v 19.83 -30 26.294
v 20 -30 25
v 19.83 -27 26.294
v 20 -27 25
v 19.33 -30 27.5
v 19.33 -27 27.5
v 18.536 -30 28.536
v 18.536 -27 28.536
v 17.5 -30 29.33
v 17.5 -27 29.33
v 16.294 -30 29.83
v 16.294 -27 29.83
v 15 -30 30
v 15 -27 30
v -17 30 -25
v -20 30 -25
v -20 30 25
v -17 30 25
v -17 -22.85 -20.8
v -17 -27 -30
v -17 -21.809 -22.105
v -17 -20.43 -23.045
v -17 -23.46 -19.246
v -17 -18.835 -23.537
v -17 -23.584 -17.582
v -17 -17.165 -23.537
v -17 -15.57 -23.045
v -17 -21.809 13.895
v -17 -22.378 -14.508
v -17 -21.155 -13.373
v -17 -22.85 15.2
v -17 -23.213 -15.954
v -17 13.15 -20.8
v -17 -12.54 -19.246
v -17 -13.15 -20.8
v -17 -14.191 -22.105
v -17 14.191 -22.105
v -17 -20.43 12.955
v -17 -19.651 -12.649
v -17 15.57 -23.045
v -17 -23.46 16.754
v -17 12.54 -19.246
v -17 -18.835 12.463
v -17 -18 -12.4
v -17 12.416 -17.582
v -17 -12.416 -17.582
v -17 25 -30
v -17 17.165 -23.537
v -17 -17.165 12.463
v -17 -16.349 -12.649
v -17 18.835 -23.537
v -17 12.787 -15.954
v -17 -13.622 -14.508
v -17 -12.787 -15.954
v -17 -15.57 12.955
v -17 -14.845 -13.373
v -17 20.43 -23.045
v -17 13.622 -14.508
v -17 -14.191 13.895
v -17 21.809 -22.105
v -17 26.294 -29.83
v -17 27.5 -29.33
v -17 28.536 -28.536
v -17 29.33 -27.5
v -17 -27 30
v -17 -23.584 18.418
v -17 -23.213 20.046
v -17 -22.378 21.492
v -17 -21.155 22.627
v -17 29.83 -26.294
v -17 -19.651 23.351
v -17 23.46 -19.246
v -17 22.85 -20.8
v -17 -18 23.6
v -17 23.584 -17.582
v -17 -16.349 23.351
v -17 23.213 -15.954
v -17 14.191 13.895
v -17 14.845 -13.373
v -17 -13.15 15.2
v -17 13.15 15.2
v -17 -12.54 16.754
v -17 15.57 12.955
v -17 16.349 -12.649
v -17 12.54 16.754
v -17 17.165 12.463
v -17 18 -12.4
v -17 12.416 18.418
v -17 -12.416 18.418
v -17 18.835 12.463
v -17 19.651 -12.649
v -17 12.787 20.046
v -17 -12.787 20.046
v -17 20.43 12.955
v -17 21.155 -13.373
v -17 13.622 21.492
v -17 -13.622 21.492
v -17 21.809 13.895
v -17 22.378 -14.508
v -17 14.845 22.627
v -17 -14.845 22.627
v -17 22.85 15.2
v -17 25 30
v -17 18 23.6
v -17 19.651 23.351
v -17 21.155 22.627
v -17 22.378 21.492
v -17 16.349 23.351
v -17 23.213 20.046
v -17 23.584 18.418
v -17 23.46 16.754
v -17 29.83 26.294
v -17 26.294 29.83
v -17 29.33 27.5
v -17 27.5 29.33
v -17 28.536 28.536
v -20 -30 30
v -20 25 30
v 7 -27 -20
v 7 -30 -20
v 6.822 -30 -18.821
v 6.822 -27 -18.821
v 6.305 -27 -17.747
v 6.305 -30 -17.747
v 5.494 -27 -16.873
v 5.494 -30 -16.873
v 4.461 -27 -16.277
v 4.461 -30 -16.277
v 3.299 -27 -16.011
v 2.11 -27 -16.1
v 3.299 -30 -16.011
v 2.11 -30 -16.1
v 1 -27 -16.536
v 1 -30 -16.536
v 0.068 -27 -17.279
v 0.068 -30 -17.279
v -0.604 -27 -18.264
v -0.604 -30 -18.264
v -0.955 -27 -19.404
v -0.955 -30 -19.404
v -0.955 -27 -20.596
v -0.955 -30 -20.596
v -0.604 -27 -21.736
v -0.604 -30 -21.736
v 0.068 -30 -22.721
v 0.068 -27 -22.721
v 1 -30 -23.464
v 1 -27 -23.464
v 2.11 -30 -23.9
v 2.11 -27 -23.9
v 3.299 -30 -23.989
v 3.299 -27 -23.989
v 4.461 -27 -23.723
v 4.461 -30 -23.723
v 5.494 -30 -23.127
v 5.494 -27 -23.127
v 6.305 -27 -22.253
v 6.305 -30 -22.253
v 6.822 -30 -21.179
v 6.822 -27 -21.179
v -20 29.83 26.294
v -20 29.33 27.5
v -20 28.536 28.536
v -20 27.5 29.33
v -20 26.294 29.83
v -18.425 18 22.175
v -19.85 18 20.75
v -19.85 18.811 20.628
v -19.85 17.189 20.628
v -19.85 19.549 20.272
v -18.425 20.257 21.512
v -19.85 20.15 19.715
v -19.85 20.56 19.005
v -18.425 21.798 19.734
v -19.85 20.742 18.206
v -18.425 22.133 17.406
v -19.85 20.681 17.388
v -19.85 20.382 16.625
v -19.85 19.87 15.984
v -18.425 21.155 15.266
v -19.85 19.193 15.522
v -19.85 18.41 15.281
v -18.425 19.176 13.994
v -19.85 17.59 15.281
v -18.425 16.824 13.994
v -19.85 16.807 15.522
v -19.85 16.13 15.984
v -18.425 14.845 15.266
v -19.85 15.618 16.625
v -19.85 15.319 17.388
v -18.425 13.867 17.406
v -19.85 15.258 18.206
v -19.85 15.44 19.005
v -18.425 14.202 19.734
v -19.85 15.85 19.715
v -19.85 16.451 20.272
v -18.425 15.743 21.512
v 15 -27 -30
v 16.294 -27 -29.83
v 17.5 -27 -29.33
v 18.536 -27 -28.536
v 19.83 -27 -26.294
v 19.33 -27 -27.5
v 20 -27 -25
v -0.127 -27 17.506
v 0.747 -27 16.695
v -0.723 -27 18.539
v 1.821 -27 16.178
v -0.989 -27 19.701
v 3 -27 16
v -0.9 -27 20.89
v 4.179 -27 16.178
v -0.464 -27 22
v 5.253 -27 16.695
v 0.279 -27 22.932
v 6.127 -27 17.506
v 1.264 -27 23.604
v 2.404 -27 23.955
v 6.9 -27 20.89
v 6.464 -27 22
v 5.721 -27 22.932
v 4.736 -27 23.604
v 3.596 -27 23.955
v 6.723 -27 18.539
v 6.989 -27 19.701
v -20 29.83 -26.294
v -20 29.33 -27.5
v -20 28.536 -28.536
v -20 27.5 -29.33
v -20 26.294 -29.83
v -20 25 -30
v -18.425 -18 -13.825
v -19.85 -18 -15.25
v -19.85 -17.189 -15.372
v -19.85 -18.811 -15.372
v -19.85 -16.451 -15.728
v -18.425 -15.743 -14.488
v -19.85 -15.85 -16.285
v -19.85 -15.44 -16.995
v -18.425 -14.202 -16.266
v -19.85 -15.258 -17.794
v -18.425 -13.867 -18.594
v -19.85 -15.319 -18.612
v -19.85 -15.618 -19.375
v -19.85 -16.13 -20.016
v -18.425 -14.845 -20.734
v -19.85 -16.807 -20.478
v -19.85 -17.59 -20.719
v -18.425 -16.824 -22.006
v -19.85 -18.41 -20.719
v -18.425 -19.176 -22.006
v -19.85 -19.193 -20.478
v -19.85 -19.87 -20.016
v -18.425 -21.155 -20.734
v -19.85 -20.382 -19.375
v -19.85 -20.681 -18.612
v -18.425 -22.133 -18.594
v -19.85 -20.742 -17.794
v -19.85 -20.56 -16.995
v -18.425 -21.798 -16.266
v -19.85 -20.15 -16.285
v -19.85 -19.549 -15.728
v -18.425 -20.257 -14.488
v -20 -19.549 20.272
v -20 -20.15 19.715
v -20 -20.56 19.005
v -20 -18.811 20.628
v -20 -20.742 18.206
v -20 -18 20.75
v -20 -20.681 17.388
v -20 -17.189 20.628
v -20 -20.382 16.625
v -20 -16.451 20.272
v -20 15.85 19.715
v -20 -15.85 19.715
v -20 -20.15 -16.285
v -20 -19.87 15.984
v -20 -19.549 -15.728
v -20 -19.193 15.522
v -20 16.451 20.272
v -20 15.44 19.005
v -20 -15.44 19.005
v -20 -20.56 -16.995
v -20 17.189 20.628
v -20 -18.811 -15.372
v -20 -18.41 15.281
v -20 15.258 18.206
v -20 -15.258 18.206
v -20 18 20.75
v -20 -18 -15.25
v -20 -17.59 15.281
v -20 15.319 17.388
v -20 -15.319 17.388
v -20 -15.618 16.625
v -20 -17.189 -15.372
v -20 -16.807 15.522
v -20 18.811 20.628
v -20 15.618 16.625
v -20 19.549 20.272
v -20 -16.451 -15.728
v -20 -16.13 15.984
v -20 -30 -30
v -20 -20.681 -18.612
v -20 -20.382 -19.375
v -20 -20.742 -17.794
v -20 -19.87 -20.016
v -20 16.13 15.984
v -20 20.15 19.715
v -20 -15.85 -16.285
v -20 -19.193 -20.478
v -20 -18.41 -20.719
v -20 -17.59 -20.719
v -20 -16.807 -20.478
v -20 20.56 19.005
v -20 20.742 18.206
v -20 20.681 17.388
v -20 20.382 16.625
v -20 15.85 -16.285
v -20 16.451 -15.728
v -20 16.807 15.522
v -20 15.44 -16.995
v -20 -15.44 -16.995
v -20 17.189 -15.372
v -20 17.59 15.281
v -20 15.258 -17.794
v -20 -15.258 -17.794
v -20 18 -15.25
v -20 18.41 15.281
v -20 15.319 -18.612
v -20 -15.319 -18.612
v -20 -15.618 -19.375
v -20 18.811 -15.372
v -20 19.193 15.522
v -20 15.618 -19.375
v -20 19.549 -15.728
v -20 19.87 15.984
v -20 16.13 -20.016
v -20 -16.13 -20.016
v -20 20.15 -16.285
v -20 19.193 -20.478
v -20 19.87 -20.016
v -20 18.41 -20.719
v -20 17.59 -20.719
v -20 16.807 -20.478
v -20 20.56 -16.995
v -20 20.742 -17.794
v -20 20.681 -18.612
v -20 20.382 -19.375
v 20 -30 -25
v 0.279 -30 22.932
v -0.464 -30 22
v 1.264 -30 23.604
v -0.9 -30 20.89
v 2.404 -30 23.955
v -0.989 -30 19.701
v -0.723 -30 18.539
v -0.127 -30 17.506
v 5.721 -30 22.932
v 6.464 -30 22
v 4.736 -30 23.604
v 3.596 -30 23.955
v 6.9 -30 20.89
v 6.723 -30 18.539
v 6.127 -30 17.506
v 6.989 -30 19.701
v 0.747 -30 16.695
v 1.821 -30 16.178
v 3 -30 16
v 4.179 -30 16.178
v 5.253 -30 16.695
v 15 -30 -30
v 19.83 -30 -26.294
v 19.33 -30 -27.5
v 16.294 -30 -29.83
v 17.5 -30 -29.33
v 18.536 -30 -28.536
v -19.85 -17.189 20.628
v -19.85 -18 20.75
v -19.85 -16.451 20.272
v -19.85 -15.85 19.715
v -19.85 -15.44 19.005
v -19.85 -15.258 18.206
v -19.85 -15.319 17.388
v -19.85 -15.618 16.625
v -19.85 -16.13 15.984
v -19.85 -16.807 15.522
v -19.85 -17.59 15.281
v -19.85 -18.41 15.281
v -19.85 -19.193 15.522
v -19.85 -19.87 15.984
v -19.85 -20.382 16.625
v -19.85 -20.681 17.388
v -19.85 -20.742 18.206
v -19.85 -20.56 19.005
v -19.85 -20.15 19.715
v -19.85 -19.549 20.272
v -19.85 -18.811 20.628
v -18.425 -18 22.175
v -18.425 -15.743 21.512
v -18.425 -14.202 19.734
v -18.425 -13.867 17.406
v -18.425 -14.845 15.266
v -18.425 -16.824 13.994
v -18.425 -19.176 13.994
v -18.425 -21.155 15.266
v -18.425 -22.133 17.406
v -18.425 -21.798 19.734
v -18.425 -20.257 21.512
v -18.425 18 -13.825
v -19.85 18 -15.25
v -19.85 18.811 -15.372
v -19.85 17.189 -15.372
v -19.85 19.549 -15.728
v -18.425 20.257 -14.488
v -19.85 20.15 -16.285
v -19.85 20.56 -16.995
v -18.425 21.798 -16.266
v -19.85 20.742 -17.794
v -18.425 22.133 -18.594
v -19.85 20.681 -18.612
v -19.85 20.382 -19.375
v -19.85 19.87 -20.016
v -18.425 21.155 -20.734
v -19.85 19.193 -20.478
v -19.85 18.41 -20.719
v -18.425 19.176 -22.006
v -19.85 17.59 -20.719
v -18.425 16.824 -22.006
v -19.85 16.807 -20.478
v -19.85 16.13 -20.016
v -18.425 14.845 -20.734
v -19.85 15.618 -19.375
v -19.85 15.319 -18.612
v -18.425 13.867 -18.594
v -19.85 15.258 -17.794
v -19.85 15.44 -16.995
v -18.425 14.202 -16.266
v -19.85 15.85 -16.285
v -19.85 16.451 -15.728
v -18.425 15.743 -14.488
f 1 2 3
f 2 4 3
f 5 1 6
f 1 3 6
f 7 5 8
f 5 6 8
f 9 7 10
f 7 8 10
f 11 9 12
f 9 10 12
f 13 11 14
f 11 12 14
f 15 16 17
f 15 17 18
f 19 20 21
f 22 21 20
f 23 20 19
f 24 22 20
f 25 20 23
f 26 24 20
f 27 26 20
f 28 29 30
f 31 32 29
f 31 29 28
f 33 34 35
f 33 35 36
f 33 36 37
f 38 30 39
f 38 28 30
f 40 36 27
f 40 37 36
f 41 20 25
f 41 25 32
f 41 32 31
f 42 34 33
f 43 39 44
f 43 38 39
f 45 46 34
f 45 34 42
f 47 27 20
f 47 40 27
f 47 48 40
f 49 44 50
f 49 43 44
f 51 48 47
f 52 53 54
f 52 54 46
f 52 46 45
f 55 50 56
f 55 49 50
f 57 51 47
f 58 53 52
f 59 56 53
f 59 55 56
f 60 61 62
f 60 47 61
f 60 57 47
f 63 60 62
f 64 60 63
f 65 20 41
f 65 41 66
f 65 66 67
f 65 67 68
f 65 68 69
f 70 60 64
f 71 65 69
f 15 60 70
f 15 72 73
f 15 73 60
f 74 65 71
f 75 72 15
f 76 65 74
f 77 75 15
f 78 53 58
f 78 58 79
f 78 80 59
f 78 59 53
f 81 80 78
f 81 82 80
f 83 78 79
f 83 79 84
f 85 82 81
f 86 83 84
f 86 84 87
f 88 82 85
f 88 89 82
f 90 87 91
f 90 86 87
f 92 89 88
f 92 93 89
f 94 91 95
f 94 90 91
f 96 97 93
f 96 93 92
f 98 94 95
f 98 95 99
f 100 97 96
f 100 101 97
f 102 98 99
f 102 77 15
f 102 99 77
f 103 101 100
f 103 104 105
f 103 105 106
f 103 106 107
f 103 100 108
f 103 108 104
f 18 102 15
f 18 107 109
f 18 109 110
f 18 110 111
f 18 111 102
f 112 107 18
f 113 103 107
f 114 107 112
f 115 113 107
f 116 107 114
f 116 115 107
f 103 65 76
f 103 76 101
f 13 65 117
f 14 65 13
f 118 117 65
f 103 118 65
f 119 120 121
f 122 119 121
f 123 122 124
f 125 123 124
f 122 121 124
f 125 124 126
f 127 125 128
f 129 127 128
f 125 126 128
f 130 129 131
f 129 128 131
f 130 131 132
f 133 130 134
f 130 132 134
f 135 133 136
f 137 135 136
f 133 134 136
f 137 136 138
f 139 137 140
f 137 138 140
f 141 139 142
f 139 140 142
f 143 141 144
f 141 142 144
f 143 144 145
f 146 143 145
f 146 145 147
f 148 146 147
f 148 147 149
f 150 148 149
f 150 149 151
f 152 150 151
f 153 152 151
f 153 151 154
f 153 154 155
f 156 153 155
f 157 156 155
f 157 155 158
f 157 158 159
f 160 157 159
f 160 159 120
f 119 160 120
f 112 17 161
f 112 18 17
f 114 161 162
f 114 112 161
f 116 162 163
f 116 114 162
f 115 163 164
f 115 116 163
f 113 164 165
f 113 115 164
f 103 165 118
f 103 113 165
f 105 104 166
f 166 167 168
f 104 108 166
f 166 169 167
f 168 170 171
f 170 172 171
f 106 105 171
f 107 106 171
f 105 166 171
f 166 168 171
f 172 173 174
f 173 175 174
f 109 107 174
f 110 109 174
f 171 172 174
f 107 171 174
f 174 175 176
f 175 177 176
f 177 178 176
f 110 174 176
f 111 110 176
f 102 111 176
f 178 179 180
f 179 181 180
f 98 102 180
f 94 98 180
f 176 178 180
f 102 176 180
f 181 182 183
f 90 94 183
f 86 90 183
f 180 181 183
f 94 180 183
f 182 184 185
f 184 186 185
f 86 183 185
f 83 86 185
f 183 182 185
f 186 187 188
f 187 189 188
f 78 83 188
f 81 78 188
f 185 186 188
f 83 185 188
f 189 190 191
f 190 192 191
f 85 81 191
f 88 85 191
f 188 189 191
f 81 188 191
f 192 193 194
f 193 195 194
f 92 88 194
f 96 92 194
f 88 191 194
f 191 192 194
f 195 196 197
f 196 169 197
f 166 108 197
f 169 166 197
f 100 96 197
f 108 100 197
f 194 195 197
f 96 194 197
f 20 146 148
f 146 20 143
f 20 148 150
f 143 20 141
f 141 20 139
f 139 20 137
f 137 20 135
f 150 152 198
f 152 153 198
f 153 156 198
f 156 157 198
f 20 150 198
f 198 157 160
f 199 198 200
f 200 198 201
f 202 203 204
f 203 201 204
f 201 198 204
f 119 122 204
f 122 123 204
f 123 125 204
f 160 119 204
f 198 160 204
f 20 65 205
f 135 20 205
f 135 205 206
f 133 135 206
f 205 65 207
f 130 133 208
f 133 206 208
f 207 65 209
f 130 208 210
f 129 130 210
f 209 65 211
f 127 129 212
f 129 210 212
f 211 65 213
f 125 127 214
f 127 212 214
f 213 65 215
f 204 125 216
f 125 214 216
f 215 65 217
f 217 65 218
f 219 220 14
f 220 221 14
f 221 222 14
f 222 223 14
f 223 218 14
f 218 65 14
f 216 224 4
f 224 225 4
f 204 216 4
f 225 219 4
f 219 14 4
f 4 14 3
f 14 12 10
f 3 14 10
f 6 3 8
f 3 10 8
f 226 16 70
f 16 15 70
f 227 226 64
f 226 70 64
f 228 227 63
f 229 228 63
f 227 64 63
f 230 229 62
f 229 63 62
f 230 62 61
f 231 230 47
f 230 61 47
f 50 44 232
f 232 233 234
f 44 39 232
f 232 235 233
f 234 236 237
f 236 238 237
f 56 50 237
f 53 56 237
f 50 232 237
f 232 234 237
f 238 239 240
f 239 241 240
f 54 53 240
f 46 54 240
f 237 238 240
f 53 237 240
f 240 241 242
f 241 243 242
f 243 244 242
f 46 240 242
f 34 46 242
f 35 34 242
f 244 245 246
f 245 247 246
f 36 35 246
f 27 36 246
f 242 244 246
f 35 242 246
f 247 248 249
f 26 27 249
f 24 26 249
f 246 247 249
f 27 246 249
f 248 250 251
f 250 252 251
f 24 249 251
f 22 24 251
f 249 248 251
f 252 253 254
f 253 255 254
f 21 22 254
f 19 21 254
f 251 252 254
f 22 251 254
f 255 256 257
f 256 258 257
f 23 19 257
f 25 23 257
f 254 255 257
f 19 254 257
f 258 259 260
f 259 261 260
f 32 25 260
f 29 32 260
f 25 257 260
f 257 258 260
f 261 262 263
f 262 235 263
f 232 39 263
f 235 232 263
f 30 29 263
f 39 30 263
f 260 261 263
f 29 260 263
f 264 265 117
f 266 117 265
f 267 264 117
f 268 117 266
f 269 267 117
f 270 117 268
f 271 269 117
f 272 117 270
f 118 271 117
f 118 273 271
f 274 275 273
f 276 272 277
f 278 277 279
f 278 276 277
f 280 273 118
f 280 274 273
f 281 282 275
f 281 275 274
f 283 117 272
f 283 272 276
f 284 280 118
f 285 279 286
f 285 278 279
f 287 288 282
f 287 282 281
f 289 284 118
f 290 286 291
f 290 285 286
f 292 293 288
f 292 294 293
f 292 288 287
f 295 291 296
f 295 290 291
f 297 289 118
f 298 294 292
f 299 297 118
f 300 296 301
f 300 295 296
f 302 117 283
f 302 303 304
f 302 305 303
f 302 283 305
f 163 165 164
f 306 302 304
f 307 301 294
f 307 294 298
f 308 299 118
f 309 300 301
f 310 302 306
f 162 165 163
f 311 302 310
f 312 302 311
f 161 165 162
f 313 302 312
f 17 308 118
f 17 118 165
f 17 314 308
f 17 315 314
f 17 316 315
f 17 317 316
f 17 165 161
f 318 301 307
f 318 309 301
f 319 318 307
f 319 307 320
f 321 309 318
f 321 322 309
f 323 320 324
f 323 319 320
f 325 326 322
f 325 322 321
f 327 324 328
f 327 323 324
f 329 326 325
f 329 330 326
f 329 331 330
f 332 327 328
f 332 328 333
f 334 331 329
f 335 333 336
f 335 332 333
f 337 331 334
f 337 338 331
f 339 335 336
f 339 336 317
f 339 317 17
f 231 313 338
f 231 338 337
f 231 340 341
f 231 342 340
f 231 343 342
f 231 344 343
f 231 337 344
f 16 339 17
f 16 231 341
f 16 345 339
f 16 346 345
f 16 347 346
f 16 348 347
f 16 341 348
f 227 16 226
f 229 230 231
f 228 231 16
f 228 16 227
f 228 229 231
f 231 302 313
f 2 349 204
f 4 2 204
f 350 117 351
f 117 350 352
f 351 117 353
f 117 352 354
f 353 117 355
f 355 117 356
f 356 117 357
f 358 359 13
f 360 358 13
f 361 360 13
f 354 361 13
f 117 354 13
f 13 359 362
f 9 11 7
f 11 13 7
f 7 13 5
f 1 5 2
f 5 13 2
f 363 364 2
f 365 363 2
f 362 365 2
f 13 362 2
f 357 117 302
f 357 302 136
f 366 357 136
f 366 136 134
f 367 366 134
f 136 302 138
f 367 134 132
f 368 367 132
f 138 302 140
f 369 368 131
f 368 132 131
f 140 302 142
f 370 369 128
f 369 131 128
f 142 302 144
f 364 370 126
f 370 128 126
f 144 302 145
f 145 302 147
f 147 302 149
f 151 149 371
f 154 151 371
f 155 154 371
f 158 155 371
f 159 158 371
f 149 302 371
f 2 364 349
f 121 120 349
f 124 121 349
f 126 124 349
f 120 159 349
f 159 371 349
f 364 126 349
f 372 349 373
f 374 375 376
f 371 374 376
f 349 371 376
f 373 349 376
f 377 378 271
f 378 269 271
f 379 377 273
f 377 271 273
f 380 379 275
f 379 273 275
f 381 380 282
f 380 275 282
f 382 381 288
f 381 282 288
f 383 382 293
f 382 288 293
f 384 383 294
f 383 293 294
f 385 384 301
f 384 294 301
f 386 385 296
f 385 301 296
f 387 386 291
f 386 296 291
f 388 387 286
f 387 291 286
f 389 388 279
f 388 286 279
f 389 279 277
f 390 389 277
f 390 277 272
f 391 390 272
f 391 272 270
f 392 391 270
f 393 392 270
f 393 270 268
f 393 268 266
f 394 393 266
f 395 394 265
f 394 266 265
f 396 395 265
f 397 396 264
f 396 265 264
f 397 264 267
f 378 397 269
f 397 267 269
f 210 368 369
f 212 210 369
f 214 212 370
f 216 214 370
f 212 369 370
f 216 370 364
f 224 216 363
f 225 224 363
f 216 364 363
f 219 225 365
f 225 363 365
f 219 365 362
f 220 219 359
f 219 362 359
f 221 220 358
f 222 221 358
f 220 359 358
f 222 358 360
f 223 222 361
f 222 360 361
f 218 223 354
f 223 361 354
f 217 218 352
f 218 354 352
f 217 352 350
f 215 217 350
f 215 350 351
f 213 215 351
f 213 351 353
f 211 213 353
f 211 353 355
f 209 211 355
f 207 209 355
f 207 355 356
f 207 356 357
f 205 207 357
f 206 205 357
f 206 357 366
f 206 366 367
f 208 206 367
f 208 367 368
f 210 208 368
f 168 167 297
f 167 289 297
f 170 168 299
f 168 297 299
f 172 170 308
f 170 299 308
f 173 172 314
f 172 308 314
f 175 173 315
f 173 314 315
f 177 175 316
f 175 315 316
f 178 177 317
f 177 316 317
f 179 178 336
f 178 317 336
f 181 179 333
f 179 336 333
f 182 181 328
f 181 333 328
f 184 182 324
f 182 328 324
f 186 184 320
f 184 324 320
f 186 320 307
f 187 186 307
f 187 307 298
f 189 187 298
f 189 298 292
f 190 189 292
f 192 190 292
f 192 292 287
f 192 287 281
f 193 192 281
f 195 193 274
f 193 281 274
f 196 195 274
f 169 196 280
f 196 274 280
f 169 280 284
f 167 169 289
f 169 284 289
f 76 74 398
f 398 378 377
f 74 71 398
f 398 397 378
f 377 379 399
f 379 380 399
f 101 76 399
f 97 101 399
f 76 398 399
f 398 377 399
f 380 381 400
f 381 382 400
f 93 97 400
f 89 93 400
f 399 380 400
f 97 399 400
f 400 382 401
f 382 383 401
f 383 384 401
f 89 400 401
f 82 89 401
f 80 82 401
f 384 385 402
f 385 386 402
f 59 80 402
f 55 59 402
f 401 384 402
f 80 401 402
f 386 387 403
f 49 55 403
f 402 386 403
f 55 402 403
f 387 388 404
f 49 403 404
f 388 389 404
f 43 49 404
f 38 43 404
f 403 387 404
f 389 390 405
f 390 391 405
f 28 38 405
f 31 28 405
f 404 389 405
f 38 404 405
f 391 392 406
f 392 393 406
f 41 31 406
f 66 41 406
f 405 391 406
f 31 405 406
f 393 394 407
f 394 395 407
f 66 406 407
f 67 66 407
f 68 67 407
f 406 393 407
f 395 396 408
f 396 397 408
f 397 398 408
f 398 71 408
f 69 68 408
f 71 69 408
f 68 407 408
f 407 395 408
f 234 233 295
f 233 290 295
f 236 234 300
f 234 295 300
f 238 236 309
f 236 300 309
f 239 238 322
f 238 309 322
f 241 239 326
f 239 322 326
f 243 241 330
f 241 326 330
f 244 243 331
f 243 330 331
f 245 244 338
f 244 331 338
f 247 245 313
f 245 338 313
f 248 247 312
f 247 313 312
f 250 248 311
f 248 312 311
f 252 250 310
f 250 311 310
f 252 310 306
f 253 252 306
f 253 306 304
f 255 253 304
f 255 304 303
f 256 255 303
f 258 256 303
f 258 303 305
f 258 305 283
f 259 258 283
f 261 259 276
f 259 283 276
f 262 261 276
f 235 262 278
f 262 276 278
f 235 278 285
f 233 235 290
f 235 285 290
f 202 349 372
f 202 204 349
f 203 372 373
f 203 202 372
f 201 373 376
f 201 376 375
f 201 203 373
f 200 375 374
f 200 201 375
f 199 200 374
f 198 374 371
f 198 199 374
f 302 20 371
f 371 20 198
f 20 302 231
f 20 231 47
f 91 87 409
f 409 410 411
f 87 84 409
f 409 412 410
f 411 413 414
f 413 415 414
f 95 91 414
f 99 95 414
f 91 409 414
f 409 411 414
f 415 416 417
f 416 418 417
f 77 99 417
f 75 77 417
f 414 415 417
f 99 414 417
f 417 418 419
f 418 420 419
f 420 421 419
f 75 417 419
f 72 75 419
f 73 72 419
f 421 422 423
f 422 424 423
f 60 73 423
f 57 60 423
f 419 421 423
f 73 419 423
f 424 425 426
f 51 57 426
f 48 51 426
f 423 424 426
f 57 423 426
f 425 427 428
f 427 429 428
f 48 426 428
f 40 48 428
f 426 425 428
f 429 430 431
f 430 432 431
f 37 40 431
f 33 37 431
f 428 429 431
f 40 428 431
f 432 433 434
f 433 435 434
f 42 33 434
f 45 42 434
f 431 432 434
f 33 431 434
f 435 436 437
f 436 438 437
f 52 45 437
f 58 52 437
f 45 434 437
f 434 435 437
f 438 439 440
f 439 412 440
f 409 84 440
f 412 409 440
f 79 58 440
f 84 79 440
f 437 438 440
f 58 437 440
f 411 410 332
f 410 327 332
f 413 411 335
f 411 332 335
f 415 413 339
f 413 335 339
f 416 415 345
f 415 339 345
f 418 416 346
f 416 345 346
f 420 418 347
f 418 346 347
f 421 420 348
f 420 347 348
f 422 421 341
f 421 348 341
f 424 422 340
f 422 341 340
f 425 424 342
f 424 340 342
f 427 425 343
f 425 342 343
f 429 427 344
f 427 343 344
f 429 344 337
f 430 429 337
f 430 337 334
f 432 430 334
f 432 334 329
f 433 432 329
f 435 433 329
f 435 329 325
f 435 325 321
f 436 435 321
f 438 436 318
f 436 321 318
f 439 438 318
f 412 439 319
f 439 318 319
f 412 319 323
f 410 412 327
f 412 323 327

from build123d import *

# Parameters (mm, degrees)
DODANIE_WYCI_GNI_CIE1_DEPTH                        = 30
DODANIE_WYCI_GNI_CIE1_DEPTH_BACK                   = 30
SZKIC1_W                                           = 40
SZKIC1_H                                           = 60
SZKIC2_W                                           = 37
SZKIC2_H                                           = 57
WYTNIJ_WYCI_GNI_CIE1_DEPTH                         = 71
SZKIC3_R                                           = 4
WYTNIJ_WYCI_GNI_CIE2_DEPTH                         = 40
POG_BIENIE_STO_KOWE_POD_M5_WKR_T_Z_BEM_D           = 5.5
POG_BIENIE_STO_KOWE_POD_M5_WKR_T_Z_BEM_DEPTH       = 10
POG_BIENIE_STO_KOWE_POD_M5_WKR_T_Z_BEM_CSINK_D     = 11.2
POG_BIENIE_STO_KOWE_POD_M5_WKR_T_Z_BEM_CSINK_ANGLE = 90
POG_BIENIE_STO_KOWE_POD_M5_WKR_T_Z_BEM_TIP         = 1.652366702
ZAOKR_GLENIE1_R                                    = 5


with BuildPart() as part:
    # Szkic1 → Dodanie-wyciągnięcie1 (new, two sides: drawn at the far end of the back side and taken through both)
    with BuildSketch(Plane.XY.offset(-DODANIE_WYCI_GNI_CIE1_DEPTH_BACK)):
        Rectangle(SZKIC1_W, SZKIC1_H)
    extrude(amount=DODANIE_WYCI_GNI_CIE1_DEPTH + DODANIE_WYCI_GNI_CIE1_DEPTH_BACK)

    # Szkic2 → Wytnij-wyciągnięcie1 (cut, through all)
    with BuildSketch(Plane.XY.offset(30)):
        with Locations((1.5, 1.5)):
            Rectangle(SZKIC2_W, SZKIC2_H)
    extrude(amount=-WYTNIJ_WYCI_GNI_CIE1_DEPTH, mode=Mode.SUBTRACT)

    # Szkic3 → Wytnij-wyciągnięcie2 (cut)
    with BuildSketch(Plane(origin=(0, -30, 0), x_dir=(-1, 0, 0), z_dir=(0, -1, 0))):
        with Locations((-3, -20)):
            Circle(SZKIC3_R)
        with Locations((-3, 20)):
            Circle(SZKIC3_R)
    extrude(amount=-WYTNIJ_WYCI_GNI_CIE2_DEPTH, mode=Mode.SUBTRACT)

    # Pogłębienie stożkowe pod M5 Wkręt z łbem stożkowym płaskim1
    with Locations(Plane(origin=(-17, 0, 0), x_dir=(0, 0, -1), z_dir=(1, 0, 0))):
        with Locations((-18, 18), (18, 18), (18, -18), (-18, -18)):
            CounterSinkHole(POG_BIENIE_STO_KOWE_POD_M5_WKR_T_Z_BEM_D / 2, POG_BIENIE_STO_KOWE_POD_M5_WKR_T_Z_BEM_CSINK_D / 2, depth=POG_BIENIE_STO_KOWE_POD_M5_WKR_T_Z_BEM_DEPTH, counter_sink_angle=POG_BIENIE_STO_KOWE_POD_M5_WKR_T_Z_BEM_CSINK_ANGLE)
            with Locations((0, 0, -(POG_BIENIE_STO_KOWE_POD_M5_WKR_T_Z_BEM_DEPTH + POG_BIENIE_STO_KOWE_POD_M5_WKR_T_Z_BEM_TIP / 2))):  # 118° drill point
                Cone(0, POG_BIENIE_STO_KOWE_POD_M5_WKR_T_Z_BEM_D / 2, POG_BIENIE_STO_KOWE_POD_M5_WKR_T_Z_BEM_TIP, mode=Mode.SUBTRACT)

    # Zaokrąglenie1
    zaokr_glenie1_edges = [part.edges().sort_by_distance(p)[0] for p in [
        (-18.5, 30, -30),
        (-18.5, 30, 30),
        (20, -28.5, -30),
        (20, -28.5, 30),
    ]]
    fillet(zaokr_glenie1_edges, radius=ZAOKR_GLENIE1_R)


solid = part.part
